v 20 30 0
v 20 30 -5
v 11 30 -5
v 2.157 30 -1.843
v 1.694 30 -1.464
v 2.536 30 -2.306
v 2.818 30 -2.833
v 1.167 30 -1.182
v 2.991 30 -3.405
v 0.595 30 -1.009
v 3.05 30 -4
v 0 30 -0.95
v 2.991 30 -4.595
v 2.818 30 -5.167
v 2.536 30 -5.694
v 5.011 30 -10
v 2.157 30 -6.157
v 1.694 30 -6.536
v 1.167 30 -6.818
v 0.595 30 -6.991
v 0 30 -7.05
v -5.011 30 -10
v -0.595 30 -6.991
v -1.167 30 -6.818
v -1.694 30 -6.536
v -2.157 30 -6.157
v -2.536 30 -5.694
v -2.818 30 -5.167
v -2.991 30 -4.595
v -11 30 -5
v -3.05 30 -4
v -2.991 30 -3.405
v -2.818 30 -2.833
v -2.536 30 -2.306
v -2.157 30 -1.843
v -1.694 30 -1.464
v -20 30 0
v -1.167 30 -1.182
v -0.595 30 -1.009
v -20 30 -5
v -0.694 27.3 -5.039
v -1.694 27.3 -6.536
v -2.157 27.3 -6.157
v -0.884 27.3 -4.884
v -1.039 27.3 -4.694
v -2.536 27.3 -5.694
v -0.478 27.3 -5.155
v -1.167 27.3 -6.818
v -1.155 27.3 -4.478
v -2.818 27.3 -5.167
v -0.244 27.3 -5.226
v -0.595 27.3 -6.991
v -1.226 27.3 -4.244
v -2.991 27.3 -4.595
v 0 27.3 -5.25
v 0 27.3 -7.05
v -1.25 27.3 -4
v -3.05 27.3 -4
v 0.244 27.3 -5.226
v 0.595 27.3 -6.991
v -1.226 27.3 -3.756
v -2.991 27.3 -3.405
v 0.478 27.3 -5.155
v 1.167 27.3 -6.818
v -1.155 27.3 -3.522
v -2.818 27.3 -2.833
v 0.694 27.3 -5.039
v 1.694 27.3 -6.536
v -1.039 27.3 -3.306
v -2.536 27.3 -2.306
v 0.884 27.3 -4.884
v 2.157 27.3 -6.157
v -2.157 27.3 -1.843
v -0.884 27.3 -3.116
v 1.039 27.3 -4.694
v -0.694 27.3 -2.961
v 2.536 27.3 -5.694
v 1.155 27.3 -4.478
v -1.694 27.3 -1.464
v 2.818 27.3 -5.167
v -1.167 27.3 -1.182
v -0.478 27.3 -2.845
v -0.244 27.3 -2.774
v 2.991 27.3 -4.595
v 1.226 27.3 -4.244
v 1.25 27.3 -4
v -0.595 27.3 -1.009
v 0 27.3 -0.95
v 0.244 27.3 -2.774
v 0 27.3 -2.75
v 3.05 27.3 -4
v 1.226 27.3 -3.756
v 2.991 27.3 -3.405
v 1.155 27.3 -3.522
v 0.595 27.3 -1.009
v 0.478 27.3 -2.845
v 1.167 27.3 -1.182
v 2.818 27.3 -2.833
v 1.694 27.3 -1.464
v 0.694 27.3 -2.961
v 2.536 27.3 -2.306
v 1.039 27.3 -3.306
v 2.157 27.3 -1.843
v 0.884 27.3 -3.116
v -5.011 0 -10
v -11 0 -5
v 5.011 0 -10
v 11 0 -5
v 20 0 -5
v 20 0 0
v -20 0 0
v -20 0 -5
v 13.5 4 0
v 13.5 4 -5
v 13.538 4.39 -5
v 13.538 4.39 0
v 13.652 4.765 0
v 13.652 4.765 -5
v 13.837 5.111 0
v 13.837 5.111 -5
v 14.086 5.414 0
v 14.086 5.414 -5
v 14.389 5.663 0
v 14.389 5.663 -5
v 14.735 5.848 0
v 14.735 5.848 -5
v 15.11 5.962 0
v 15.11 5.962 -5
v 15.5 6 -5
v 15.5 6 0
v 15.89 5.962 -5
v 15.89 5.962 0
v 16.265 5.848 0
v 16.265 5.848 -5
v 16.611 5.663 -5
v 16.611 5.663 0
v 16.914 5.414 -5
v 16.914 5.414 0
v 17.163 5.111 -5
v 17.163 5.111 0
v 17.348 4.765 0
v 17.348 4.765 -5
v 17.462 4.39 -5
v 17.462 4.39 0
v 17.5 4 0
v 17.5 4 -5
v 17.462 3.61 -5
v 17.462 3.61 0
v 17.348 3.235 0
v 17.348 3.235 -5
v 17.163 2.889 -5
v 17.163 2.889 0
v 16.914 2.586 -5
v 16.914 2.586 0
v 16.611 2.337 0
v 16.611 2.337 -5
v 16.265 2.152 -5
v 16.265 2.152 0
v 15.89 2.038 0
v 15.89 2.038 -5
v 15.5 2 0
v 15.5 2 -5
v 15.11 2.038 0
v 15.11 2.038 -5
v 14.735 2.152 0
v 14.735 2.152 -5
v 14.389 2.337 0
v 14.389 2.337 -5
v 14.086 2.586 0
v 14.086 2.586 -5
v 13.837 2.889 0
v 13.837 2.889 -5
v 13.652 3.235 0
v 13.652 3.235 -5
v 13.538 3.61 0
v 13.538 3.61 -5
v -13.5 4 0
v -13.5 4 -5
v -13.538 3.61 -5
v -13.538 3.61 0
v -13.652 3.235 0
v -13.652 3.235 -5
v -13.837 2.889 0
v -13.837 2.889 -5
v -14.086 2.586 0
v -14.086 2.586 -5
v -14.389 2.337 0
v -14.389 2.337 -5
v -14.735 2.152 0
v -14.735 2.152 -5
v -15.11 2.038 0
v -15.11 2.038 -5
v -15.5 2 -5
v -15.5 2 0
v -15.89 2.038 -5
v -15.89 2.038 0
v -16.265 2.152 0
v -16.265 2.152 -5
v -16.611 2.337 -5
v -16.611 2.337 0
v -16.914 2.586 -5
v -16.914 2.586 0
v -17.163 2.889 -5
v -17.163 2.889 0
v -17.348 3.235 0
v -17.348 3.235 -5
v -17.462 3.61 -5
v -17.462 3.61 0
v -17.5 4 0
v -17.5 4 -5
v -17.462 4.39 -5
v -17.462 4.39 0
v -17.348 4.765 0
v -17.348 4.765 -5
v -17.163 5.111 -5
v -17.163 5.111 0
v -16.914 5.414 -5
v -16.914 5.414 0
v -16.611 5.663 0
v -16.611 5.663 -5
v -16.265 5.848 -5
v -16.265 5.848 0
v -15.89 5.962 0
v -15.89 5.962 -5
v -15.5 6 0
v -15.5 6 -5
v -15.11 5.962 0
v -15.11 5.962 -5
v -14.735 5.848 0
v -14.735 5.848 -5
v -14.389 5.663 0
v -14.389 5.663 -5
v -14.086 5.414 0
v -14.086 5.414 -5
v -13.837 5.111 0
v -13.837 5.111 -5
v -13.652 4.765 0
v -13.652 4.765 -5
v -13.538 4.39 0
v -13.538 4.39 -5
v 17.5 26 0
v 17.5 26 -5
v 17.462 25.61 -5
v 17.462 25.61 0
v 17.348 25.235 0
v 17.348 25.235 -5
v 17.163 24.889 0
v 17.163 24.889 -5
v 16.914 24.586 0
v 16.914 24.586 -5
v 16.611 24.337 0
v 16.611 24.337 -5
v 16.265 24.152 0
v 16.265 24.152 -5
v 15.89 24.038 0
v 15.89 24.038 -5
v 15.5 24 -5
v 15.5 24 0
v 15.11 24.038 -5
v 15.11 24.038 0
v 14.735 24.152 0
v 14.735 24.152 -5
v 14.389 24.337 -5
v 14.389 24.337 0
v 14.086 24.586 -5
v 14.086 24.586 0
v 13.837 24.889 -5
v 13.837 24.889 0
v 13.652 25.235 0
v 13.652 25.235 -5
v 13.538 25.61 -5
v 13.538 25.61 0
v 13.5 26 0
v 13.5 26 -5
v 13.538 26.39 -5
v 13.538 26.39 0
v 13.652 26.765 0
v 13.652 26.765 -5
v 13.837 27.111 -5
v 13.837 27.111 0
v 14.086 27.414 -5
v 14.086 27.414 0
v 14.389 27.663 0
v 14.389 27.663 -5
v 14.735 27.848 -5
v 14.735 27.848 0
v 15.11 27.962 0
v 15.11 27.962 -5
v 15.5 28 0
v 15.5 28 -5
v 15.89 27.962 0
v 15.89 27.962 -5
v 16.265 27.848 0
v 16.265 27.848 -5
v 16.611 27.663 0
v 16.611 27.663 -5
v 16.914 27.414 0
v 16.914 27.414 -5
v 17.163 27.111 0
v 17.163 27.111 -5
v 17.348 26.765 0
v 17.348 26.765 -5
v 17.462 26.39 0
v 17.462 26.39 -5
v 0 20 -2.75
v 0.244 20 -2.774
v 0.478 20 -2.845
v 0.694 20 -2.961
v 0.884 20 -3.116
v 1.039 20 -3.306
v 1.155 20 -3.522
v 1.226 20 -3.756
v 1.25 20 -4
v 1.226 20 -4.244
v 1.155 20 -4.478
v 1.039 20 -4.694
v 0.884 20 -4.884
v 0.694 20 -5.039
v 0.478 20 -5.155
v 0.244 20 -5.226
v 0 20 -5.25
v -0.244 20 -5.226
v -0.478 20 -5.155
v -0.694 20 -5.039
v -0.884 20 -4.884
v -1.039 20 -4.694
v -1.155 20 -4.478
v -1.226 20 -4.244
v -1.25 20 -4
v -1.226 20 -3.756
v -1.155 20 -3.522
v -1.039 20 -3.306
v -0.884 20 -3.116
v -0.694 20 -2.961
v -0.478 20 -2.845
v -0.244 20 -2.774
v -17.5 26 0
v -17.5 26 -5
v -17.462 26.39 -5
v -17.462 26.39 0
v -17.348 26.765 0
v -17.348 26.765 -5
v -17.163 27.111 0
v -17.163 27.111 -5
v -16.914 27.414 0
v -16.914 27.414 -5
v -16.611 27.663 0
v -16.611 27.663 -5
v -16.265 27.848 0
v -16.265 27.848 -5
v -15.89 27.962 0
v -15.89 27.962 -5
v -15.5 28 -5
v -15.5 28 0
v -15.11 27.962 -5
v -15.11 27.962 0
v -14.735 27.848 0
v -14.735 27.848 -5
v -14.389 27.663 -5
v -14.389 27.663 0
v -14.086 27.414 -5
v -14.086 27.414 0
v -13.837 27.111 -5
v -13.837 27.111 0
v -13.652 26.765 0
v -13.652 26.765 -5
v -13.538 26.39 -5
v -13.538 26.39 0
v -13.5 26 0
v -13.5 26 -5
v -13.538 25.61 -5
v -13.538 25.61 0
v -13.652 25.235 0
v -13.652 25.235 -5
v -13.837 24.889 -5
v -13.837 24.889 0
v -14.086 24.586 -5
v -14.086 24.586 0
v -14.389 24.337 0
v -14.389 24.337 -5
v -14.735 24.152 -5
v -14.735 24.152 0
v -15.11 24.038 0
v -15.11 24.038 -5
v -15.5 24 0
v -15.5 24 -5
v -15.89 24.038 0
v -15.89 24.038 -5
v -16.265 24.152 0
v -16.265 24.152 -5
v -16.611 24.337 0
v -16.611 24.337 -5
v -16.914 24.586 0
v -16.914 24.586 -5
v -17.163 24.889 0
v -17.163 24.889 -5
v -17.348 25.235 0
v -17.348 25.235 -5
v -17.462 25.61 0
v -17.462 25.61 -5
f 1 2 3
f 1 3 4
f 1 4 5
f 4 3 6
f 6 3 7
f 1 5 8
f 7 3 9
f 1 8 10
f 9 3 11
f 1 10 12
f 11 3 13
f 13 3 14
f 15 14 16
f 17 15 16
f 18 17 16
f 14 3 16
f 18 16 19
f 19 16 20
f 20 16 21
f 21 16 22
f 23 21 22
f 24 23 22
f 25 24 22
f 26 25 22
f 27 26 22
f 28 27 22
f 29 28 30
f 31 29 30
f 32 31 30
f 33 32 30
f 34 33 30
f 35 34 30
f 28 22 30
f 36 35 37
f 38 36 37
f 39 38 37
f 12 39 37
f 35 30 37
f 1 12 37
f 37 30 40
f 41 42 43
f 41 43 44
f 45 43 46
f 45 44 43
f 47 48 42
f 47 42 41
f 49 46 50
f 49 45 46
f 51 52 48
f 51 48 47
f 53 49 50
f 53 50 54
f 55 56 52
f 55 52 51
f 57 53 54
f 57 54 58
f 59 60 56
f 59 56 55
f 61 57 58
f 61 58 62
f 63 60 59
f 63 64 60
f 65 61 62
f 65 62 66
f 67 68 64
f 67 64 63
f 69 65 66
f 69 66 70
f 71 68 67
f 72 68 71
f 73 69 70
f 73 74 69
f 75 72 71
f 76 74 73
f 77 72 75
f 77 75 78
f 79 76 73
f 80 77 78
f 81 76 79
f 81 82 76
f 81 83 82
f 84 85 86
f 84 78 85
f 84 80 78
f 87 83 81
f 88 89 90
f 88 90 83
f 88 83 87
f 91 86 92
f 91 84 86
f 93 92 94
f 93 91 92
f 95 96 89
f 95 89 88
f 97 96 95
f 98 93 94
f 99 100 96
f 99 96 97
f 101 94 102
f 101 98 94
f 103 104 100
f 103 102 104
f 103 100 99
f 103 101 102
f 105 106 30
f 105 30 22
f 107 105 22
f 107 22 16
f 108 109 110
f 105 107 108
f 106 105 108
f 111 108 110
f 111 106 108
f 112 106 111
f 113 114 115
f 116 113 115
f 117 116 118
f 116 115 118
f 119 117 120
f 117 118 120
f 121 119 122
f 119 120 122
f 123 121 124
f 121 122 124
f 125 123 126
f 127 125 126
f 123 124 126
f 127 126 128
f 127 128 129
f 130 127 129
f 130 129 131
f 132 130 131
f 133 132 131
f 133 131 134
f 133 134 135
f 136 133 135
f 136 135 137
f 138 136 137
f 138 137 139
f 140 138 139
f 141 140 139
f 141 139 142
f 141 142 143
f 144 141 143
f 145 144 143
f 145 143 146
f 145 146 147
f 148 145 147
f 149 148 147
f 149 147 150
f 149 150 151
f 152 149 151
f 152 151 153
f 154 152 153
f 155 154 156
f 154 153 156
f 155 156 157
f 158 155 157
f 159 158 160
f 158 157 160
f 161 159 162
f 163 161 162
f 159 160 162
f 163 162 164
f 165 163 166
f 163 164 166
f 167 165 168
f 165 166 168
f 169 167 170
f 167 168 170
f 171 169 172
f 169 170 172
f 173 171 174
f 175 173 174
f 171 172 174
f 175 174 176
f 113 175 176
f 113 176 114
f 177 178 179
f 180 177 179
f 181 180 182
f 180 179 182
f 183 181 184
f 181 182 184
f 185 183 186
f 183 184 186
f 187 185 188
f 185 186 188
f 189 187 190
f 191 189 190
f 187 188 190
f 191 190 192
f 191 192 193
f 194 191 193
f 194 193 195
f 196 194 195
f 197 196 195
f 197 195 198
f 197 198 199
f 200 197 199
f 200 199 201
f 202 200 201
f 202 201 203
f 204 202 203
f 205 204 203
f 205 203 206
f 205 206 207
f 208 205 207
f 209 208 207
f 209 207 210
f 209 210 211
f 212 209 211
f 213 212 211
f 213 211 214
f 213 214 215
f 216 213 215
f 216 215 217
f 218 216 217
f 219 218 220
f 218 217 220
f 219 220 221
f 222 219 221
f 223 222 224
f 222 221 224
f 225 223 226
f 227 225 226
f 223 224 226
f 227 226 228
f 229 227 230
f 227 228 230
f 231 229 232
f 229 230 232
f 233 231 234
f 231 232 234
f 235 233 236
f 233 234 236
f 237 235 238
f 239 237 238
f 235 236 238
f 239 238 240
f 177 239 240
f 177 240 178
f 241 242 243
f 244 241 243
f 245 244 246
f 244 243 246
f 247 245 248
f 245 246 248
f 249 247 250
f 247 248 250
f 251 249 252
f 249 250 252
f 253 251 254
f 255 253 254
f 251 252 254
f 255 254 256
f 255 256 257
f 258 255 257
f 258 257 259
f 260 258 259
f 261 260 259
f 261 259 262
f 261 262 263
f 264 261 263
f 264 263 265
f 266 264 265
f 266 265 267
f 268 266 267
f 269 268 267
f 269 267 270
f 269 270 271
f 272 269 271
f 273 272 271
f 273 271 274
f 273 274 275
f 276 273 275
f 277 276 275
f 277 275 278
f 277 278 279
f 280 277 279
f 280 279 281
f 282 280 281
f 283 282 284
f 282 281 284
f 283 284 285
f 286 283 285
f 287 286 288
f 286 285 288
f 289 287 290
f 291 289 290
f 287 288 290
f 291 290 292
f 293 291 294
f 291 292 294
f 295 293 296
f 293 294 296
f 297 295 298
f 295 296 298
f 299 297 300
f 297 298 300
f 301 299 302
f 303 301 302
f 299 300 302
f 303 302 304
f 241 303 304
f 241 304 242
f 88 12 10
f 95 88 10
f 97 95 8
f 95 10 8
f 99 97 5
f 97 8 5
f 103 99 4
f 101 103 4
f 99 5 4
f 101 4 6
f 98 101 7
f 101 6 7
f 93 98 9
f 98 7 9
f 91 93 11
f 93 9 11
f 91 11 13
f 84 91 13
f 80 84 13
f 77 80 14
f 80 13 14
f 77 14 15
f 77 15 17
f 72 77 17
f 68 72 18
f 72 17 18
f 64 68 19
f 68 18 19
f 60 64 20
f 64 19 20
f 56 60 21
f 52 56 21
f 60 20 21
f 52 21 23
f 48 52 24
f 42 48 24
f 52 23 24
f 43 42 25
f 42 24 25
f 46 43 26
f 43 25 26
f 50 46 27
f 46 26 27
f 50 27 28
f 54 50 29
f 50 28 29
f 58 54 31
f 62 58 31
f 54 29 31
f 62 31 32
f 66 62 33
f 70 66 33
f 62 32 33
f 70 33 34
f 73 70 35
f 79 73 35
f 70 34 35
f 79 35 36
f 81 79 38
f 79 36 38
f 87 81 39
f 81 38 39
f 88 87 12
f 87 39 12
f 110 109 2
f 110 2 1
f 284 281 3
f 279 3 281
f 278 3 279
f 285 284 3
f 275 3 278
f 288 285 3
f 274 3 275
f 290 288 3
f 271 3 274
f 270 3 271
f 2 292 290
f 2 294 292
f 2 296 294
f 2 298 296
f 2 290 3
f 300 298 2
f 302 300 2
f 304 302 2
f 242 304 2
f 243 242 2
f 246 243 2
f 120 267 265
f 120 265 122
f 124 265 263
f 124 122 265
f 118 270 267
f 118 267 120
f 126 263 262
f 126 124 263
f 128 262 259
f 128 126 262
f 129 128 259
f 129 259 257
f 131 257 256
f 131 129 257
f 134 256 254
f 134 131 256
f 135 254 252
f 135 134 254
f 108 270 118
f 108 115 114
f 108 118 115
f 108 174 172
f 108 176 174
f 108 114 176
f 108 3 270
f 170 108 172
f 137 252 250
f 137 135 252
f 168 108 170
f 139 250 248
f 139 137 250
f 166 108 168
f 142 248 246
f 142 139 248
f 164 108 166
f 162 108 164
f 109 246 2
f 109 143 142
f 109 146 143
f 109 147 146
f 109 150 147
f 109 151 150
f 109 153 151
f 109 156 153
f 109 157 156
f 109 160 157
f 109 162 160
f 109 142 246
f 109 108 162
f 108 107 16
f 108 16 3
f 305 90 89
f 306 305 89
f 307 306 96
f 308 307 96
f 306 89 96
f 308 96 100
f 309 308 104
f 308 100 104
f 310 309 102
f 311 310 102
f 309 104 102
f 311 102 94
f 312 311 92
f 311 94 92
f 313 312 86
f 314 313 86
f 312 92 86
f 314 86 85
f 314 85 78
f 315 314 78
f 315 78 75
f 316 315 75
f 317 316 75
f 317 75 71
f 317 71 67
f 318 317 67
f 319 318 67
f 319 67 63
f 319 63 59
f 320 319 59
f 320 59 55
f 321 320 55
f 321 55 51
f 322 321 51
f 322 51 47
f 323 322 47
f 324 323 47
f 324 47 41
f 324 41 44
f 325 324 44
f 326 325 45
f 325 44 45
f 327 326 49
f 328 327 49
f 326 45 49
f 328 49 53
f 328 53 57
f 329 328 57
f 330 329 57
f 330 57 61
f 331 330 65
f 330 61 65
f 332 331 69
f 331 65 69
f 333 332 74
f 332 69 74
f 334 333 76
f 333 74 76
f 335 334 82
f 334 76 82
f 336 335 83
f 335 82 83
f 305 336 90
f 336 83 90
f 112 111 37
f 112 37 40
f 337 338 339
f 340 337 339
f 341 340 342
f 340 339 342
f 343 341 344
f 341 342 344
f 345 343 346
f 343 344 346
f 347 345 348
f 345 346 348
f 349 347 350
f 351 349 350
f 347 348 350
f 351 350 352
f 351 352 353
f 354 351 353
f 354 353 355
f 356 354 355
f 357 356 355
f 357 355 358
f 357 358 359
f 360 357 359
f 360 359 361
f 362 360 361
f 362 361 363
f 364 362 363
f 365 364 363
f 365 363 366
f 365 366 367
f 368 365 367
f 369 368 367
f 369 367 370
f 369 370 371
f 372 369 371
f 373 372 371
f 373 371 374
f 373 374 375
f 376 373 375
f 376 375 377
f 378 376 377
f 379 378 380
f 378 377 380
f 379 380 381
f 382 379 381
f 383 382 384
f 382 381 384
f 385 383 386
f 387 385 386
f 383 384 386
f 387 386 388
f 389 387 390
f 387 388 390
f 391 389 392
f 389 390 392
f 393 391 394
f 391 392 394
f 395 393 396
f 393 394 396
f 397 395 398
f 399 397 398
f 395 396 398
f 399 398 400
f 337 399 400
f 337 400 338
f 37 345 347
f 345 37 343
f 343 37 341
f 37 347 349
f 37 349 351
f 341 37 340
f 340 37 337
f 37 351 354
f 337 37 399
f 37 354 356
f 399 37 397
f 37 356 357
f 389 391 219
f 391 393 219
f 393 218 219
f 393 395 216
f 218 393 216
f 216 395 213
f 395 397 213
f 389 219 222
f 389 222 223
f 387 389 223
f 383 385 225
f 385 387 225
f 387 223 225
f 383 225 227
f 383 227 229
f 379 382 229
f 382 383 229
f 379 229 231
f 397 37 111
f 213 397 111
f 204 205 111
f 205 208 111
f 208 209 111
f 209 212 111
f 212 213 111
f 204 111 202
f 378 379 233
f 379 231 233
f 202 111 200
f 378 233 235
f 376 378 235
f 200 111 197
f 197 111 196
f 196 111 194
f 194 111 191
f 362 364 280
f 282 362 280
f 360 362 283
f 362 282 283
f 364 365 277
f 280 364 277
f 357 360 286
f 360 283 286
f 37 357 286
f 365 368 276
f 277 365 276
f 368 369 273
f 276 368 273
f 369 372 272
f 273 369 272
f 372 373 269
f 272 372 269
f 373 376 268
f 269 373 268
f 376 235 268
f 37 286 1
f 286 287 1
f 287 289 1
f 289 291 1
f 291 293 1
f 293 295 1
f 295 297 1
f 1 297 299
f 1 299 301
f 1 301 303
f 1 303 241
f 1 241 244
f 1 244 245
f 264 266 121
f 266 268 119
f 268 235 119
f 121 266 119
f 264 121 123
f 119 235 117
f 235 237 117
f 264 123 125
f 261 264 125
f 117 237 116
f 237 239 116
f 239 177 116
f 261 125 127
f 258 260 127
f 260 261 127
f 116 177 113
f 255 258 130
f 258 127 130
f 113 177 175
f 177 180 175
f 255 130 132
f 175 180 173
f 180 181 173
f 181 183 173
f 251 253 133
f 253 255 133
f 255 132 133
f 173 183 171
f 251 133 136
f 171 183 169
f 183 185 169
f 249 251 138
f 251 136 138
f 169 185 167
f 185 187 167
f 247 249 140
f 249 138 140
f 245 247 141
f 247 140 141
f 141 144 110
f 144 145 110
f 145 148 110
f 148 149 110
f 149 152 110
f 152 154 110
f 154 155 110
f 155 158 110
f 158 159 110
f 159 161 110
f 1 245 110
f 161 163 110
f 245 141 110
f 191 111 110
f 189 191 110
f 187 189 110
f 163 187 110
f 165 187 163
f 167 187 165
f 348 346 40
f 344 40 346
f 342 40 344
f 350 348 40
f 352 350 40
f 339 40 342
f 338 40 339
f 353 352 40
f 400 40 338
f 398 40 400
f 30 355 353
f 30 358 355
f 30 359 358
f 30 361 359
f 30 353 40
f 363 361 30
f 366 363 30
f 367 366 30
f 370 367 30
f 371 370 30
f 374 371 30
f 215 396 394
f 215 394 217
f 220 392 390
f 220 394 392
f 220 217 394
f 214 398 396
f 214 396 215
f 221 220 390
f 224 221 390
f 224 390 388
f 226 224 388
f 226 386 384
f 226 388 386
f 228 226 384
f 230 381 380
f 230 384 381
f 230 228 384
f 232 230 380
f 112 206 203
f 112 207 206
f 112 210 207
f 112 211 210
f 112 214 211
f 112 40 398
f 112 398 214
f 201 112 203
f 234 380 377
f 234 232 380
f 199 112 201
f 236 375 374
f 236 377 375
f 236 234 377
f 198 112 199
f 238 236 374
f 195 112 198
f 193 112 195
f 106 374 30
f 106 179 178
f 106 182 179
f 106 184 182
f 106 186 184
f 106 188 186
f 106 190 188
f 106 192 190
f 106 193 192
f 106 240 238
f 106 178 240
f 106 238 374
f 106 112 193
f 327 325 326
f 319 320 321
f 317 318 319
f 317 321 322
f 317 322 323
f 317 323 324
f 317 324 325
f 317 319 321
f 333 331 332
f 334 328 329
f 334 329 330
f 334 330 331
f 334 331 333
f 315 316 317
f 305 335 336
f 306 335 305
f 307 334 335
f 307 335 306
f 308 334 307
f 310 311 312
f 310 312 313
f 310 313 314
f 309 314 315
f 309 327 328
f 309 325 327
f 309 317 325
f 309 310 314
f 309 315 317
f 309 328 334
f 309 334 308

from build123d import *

# Parameters (mm, degrees)
BOSS_EXTRUDE2_DEPTH = 30
SKETCH2_R           = 1.25
CUT_EXTRUDE1_DEPTH  = 10
SKETCH4_R           = 2
CUT_EXTRUDE5_DEPTH  = 37.400549446
SKETCH5_R           = 3.05
CUT_EXTRUDE6_DEPTH  = 2.7


with BuildPart() as part:
    # Sketch1 → Boss-Extrude2 (new body)
    with BuildSketch(Plane(origin=(0, 0, 0), x_dir=(1, 0, 0), z_dir=(0, 1, 0))):
        Polygon((0, 0), (-20, 0), (-20, 5), (-11, 5), (-5.01141852, 10), (5.01141852, 10), (11, 5), (20, 5), (20, 0), align=None)
    extrude(amount=BOSS_EXTRUDE2_DEPTH)

    # Sketch2 → Cut-Extrude1 (cut)
    with BuildSketch(Plane(origin=(0, 30, 0), x_dir=(1, 0, 0), z_dir=(0, 1, 0))):
        with Locations(Location((0, 4, 0), (0, 0, 270))):
            Circle(SKETCH2_R)
    extrude(amount=-CUT_EXTRUDE1_DEPTH, mode=Mode.SUBTRACT)

    # Sketch4 → Cut-Extrude5 (cut, through all)
    with BuildSketch(Plane(origin=(0, 0, -5), x_dir=(-1, 0, 0), z_dir=(0, 0, -1))):
        with Locations((-15.5, 4)):
            Circle(SKETCH4_R)
        with Locations(Location((-15.5, 26, 0), (0, 0, 180))):
            Circle(SKETCH4_R)
        with Locations(Location((15.5, 4, 0), (0, 0, 180))):
            Circle(SKETCH4_R)
        with Locations((15.5, 26)):
            Circle(SKETCH4_R)
    extrude(amount=-CUT_EXTRUDE5_DEPTH, mode=Mode.SUBTRACT)

    # Sketch5 → Cut-Extrude6 (cut)
    with BuildSketch(Plane(origin=(0, 30, 0), x_dir=(1, 0, 0), z_dir=(0, 1, 0))):
        with Locations(Location((0, 4, 0), (0, 0, 270))):
            Circle(SKETCH5_R)
    extrude(amount=-CUT_EXTRUDE6_DEPTH, mode=Mode.SUBTRACT)


solid = part.part
